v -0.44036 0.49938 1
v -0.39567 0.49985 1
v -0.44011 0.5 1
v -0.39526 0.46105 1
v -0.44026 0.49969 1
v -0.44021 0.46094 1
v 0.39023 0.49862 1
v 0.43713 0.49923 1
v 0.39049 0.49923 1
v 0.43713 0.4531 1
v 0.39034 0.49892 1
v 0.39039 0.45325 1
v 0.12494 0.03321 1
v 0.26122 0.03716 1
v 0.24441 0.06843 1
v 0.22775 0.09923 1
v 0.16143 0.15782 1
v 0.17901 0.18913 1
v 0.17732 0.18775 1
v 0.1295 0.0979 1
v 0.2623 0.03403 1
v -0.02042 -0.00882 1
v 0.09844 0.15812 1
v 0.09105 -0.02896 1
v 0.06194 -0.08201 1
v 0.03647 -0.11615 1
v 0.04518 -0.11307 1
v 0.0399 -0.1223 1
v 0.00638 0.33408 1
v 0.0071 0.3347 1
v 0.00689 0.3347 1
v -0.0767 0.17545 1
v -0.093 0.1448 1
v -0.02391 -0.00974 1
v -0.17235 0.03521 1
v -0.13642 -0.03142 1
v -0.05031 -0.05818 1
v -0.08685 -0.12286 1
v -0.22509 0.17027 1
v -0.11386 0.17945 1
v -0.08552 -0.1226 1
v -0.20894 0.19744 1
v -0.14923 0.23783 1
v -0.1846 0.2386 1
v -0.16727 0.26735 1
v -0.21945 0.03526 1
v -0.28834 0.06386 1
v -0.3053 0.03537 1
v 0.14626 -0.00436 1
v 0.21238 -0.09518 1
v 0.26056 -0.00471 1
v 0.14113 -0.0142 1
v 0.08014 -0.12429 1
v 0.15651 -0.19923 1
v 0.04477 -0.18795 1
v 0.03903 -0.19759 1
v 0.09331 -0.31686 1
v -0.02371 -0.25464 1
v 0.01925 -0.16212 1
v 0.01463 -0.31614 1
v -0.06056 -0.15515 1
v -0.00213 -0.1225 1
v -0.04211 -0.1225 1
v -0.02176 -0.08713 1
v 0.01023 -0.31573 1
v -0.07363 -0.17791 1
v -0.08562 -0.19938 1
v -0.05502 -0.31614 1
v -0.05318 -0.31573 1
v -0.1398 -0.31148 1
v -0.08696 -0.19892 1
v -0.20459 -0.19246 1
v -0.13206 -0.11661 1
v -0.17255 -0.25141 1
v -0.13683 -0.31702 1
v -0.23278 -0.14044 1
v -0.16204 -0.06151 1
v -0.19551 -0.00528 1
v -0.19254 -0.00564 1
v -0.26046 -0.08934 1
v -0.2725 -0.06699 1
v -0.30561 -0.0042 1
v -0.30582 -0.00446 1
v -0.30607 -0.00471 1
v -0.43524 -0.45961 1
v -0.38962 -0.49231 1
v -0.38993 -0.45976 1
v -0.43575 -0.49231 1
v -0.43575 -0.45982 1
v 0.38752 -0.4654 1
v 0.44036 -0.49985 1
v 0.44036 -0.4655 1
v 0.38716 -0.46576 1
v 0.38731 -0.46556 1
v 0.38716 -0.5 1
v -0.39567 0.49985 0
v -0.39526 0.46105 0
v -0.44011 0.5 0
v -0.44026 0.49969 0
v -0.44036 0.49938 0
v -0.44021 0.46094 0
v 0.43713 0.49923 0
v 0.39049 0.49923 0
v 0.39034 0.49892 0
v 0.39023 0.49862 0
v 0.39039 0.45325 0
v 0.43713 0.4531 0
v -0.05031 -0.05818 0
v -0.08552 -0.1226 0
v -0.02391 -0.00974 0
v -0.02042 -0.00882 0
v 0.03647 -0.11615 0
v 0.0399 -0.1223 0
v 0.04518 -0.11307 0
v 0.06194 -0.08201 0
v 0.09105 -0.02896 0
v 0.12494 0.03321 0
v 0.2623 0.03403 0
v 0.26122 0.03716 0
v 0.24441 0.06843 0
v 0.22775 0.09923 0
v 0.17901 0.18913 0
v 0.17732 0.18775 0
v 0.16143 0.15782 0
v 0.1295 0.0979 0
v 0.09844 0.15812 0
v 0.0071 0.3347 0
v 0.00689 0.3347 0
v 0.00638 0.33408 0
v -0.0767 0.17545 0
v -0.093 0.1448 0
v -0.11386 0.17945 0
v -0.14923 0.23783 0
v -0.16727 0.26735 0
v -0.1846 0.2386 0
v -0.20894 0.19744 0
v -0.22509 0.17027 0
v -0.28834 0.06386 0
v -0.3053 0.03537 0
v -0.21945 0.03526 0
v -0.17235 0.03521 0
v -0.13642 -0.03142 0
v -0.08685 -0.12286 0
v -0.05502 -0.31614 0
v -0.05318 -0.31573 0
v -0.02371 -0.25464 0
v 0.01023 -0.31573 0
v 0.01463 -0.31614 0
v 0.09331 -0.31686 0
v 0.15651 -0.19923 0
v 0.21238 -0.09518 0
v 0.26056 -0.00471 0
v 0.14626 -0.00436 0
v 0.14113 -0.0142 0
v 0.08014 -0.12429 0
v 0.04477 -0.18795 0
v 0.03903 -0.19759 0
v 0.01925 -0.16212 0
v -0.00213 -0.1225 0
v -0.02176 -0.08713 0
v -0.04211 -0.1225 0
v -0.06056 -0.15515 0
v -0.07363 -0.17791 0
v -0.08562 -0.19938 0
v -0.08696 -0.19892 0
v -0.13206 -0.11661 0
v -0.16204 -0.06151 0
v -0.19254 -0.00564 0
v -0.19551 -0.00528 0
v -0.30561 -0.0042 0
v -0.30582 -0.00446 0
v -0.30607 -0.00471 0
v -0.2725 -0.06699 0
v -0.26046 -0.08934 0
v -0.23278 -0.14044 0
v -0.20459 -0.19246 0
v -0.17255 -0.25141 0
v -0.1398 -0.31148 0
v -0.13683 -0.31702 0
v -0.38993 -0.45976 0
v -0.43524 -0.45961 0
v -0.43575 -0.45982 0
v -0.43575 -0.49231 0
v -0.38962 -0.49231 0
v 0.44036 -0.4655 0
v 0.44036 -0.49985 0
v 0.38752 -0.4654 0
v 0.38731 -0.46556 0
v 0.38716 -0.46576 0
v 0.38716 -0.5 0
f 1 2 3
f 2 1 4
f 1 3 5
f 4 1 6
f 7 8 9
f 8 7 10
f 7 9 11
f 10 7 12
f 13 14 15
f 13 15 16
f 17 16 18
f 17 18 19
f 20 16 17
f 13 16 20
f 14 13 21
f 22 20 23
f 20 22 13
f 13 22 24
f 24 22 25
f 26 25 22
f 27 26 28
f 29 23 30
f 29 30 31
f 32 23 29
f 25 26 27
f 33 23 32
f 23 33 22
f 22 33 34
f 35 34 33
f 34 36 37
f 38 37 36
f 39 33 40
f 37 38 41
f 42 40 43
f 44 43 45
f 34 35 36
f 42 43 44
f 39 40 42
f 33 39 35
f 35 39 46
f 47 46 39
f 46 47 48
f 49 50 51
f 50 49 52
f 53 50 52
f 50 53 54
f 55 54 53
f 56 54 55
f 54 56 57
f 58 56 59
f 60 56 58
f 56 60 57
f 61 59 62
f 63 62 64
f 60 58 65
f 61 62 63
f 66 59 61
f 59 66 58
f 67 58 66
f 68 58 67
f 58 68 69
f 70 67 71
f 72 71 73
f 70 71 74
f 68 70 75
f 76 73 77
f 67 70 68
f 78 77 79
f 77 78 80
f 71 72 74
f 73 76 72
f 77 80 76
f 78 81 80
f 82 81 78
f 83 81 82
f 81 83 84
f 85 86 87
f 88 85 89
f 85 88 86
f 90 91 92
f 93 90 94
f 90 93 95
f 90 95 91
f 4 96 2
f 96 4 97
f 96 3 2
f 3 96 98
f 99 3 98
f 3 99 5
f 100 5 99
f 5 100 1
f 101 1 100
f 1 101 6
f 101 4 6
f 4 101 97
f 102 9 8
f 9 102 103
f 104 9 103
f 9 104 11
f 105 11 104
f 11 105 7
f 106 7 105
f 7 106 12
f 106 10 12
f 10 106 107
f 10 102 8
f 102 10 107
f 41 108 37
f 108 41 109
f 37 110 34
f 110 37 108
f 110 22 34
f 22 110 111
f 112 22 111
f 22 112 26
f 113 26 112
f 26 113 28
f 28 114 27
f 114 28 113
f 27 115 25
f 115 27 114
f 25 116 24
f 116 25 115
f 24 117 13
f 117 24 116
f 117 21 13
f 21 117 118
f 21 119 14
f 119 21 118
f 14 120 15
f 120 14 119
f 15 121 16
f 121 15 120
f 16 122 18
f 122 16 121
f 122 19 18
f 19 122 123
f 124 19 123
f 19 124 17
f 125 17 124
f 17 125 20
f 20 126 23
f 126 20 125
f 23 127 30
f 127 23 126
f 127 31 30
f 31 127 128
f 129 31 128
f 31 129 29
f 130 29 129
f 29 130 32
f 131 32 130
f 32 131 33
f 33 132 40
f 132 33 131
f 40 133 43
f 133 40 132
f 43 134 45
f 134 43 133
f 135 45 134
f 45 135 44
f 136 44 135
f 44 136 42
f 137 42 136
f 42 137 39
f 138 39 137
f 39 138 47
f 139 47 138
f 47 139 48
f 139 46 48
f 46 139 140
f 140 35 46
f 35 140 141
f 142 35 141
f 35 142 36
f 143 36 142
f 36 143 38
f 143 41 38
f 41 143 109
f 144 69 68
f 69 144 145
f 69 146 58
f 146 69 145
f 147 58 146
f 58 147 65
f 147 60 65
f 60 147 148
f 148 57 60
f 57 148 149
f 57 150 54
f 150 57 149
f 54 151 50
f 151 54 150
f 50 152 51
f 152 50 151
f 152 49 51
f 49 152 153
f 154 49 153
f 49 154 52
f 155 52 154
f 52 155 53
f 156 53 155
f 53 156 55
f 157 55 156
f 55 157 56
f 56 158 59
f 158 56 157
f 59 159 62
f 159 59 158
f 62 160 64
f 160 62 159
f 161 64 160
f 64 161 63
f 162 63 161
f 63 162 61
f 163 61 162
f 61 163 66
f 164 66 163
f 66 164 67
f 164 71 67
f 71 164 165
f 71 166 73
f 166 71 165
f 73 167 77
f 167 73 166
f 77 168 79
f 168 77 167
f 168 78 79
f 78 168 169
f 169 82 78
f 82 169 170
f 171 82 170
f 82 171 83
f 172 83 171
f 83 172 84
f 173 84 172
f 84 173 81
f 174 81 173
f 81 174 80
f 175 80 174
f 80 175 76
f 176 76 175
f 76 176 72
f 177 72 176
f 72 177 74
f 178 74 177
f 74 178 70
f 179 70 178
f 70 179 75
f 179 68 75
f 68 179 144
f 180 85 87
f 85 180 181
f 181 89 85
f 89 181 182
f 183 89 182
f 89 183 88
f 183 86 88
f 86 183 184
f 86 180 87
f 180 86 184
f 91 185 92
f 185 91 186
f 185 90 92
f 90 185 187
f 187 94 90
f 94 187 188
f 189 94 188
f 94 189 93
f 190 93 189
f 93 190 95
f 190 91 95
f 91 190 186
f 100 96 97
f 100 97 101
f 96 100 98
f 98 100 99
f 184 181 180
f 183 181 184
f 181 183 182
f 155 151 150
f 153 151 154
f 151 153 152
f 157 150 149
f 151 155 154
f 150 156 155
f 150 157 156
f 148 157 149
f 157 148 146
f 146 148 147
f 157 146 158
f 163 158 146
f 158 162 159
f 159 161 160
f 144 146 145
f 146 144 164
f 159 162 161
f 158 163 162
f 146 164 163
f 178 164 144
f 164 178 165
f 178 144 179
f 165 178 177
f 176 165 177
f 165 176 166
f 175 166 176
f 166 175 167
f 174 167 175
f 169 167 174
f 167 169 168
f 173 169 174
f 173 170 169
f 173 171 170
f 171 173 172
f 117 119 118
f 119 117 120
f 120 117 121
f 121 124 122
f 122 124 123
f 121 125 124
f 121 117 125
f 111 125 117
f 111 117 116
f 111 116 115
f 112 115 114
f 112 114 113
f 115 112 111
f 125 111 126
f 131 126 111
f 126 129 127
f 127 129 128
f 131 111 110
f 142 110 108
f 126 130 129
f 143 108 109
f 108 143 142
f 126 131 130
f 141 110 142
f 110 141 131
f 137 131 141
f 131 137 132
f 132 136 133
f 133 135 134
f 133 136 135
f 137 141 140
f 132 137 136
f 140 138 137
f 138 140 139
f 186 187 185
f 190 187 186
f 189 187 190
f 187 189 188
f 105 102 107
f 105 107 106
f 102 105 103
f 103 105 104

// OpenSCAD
module WibbyMask_1()
{
 /* Generated by trace2scad version 20150415
    http://aggregate.org/MAKE/TRACE2SCAD/
    Optimized model has 97/3062 original points
 */
 color([0.5, 0.5, 0.5])
 assign(minx=285) /* polygon minx=285 */
 assign(miny=200) /* polygon miny=200 */
 assign(maxx=17468) /* polygon maxx=17468 */
 assign(maxy=19710) /* polygon maxy=19710 */
 assign(dx=maxx-minx)
 assign(dy=maxy-miny)
 assign(maxd=((dx>dy)?dx:dy))
 scale([1/maxd, 1/maxd, 1])
 translate([-minx-dx/2, -miny-dy/2, 0])
 linear_extrude(height=1, convexity=97)
 union() {
  union() {
   polygon([[287,19704],[285,19698],[288,18948],[1165,18950],[1157,19707],[290,19710]], convexity=6);
   polygon([[16492,19689],[16490,19683],[16493,18798],[17405,18795],[17405,19695],[16495,19695]], convexity=6);
   polygon([[9006,16479],[9001,16473],[7380,13378],[7062,12780],[6655,13456],[5965,14595],[5613,15171],[5275,14610],[4800,13807],[4485,13277],[3251,11201],[2920,10645],[4595,10643],[5514,10642],[6215,9342],[7182,7558],[7208,7563],[7895,8820],[8410,9765],[8478,9783],[9588,7689],[9655,7569],[9758,7749],[10085,8355],[10653,9390],[11314,10603],[13994,10619],[13973,10680],[13645,11290],[13320,11891],[12369,13645],[12336,13618],[12026,13034],[11403,11865],[10797,13040],[9015,16485],[9011,16485]], convexity=12);
   polygon([[2910,9868],[2905,9863],[3560,8648],[3795,8212],[4335,7215],[4885,6200],[5510,5050],[6149,3878],[6207,3770],[7803,3787],[7839,3795],[8414,4987],[9076,3795],[9162,3787],[10697,3773],[11930,6068],[13020,8098],[13960,9863],[11730,9870],[11630,9678],[10440,7530],[9750,6288],[9638,6100],[9252,6792],[8835,7565],[8452,8255],[8055,7565],[7695,6928],[7440,6484],[7206,6065],[7180,6074],[6300,7680],[5715,8755],[5120,9845],[5062,9852],[2914,9873]], convexity=12);
   polygon([[380,986],[375,984],[375,350],[1275,350],[1269,985],[385,988]], convexity=6);
   polygon([[16433,872],[16430,868],[16430,200],[17468,203],[17468,873],[16437,875]], convexity=6);
  }
 }
}

module WibbyMask()
{
 /* all layers combined, scaled to within a 1mm cube */
 scale([1, 1, 1/1])
 difference() {
  union() {
   scale([1,1,2]) translate([0,0,-0.5]) WibbyMask_1();
  }
  translate([0,0,-2]) cube([2,2,4],center=true);
 }
}
WibbyMask();
